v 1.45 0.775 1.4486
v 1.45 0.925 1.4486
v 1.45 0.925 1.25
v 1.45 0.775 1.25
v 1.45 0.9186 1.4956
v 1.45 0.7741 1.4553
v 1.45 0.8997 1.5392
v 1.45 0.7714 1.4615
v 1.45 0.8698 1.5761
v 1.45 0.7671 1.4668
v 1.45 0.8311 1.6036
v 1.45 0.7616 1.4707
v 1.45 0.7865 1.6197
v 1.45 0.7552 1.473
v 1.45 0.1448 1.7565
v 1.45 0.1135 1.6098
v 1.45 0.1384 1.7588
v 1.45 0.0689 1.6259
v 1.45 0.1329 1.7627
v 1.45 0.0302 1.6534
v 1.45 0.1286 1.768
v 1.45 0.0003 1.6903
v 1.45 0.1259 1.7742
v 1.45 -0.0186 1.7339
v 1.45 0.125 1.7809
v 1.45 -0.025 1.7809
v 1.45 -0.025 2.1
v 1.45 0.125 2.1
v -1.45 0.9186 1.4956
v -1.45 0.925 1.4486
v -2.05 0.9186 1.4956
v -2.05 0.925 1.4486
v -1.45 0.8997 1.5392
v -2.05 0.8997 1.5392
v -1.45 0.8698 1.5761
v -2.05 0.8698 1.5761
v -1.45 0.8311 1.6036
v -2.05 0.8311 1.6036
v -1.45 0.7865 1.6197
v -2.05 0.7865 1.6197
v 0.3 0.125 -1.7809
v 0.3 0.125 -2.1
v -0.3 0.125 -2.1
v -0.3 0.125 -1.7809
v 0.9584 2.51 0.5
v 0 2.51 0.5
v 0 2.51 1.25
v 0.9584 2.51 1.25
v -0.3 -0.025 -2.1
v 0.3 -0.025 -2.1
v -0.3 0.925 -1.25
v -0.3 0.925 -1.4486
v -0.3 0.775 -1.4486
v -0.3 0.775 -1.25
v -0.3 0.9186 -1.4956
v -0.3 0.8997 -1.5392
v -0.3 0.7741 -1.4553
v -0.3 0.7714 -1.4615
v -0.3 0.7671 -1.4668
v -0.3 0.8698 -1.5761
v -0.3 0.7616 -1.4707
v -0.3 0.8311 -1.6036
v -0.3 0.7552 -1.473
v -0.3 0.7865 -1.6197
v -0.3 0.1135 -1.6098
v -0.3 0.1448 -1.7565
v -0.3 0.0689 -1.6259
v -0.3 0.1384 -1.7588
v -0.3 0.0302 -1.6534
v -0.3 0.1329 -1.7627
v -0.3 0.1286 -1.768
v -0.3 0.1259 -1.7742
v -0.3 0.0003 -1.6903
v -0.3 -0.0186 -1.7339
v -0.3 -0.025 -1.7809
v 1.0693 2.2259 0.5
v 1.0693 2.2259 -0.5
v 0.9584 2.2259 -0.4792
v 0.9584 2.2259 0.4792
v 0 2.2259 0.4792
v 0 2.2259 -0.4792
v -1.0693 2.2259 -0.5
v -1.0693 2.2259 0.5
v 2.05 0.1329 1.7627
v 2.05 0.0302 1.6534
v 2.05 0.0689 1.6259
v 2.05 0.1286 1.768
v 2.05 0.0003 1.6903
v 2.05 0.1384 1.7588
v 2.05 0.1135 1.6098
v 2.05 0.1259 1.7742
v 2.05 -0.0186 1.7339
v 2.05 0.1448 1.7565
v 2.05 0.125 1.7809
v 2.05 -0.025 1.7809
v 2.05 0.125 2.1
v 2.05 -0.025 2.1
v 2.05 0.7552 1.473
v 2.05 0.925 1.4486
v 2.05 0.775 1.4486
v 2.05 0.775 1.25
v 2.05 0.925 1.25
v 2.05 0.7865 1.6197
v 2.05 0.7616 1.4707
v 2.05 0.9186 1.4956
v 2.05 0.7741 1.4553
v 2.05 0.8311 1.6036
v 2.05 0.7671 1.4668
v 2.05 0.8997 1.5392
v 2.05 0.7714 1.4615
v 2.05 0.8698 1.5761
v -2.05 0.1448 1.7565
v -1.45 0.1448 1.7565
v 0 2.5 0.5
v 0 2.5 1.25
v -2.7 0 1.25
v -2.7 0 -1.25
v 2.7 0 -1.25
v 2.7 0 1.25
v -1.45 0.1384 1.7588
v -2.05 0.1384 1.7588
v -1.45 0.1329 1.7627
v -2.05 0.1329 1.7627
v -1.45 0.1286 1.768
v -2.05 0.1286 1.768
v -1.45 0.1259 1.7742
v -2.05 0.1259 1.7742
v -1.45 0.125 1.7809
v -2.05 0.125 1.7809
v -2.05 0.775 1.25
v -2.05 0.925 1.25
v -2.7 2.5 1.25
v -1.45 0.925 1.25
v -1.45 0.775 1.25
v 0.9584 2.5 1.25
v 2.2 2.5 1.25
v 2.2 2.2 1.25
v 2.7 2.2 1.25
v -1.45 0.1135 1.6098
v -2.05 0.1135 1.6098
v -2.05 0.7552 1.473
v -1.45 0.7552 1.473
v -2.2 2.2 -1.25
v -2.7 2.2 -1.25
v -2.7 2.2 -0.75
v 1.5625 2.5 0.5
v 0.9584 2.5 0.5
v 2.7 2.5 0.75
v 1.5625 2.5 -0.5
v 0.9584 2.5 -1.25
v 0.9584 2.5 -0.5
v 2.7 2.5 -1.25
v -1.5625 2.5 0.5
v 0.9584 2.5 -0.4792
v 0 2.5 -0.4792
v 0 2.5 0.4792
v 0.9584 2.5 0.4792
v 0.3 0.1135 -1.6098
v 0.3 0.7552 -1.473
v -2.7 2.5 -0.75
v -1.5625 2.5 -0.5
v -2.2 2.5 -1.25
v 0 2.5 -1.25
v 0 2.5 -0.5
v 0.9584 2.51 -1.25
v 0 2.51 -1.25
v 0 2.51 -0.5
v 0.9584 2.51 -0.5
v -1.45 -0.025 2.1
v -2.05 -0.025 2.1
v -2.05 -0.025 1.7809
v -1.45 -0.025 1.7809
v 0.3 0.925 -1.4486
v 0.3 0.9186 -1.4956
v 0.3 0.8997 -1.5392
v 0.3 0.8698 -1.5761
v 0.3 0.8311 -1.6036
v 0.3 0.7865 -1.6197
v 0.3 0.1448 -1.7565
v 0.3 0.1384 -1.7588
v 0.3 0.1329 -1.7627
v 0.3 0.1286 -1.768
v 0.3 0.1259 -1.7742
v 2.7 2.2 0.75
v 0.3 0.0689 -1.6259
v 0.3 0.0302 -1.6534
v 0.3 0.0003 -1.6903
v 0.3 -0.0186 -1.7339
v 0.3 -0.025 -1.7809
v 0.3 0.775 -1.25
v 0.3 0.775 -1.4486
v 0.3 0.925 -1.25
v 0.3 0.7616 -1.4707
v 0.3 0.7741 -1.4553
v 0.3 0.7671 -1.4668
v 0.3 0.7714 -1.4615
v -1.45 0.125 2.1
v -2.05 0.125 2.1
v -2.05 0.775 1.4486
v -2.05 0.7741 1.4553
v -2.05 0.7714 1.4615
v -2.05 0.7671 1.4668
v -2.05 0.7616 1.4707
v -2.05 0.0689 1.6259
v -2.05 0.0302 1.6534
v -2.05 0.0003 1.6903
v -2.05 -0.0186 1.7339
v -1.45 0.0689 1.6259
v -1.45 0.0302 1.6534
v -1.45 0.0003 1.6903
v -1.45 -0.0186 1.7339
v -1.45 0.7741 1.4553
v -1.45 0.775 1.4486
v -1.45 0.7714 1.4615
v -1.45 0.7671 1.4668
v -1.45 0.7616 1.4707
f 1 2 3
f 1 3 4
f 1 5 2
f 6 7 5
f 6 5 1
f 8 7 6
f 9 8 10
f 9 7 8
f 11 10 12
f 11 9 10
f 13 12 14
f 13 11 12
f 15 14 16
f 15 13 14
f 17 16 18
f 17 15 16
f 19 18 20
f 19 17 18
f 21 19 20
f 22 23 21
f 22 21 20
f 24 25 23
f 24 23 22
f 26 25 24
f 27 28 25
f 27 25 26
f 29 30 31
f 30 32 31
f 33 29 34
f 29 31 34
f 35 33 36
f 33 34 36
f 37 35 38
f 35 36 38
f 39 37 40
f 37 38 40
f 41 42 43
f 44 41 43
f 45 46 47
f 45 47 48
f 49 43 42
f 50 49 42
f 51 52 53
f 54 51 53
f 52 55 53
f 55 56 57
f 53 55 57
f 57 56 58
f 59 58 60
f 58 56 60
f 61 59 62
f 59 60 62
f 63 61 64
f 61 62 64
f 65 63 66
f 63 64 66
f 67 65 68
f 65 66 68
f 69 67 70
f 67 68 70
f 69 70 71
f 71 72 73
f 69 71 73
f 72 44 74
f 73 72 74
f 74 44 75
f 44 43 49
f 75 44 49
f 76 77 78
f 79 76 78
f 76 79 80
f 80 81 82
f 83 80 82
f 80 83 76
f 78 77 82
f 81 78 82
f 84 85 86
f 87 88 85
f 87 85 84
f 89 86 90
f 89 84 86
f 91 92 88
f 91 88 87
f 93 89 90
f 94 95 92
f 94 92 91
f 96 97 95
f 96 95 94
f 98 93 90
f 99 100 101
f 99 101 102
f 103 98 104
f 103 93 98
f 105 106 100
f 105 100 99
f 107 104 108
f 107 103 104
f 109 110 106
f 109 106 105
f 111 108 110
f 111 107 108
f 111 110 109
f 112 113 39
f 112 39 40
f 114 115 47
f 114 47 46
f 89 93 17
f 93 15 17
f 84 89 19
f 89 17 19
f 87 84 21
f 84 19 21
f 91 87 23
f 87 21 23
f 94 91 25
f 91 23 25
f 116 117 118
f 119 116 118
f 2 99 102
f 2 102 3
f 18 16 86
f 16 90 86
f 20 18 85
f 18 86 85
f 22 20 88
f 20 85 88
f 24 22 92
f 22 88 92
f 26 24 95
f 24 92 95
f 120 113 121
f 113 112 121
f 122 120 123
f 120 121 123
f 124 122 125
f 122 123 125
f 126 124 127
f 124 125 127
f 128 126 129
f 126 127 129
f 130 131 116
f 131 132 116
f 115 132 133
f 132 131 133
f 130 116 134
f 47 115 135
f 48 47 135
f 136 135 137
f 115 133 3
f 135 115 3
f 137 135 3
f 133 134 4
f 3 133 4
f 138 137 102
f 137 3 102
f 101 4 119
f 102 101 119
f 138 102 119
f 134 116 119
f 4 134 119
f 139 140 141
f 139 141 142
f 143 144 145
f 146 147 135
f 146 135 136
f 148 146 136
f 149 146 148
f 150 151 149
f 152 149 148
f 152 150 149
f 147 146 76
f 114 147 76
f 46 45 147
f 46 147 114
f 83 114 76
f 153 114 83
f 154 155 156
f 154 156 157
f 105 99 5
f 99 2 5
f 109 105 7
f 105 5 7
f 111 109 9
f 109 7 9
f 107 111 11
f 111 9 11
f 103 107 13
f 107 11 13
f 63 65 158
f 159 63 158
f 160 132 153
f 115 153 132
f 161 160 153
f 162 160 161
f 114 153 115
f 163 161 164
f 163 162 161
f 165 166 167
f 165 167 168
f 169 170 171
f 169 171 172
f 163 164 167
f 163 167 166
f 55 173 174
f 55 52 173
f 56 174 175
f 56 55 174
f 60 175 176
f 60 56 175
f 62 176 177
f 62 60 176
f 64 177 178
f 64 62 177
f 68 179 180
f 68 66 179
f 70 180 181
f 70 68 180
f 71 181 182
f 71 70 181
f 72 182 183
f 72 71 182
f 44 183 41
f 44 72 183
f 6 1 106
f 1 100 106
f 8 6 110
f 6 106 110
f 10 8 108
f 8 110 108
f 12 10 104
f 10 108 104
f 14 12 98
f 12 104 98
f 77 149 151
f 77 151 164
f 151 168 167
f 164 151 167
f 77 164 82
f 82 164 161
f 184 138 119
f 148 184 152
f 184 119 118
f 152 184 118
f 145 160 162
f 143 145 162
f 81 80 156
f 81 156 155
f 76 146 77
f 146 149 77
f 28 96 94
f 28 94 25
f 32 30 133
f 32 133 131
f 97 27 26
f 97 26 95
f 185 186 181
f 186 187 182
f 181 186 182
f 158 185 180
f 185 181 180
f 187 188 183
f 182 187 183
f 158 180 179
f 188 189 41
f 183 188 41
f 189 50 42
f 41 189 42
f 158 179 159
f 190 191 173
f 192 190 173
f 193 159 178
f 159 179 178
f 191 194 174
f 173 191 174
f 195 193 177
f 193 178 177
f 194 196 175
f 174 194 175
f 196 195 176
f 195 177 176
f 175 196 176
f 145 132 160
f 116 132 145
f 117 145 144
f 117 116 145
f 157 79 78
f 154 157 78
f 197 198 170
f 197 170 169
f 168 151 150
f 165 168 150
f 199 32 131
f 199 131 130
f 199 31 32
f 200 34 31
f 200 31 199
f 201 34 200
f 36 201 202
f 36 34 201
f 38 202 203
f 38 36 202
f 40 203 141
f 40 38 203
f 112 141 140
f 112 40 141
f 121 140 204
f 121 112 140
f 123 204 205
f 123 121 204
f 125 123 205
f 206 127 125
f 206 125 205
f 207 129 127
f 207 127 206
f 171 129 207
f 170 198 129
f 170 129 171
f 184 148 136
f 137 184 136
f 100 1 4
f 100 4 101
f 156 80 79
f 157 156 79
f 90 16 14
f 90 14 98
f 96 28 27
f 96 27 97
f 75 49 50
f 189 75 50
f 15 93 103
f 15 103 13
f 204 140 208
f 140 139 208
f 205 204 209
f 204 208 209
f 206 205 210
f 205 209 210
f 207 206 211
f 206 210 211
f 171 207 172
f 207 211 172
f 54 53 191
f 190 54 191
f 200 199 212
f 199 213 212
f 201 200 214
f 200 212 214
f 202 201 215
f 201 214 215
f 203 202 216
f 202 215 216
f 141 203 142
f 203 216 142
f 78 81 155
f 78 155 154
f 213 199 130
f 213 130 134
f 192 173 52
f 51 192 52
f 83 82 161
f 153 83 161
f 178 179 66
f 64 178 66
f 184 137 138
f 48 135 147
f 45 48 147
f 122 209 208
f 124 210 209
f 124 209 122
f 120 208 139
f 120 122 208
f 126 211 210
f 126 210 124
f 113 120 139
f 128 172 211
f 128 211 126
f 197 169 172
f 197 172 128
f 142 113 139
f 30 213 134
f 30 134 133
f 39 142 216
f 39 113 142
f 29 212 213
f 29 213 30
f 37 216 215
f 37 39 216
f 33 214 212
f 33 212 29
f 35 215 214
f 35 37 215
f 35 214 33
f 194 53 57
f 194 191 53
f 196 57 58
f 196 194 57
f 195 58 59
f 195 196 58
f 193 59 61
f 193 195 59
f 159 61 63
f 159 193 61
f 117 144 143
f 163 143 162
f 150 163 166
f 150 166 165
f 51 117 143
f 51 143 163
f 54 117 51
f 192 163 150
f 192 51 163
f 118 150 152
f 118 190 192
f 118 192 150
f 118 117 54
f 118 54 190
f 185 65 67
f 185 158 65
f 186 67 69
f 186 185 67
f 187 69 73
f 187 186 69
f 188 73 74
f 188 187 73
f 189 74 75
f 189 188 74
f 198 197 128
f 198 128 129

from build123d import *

# Parameters (mm, degrees)
SKETCH1_W               = 5.4
SKETCH1_H               = 2.5
BOSS_EXTRUDE1_DEPTH     = 2.5
CUT_EXTRUDE1_DEPTH      = 0.3
CUT_EXTRUDE2_DEPTH      = 0.5
CUT_EXTRUDE2_DEPTH_BACK = 0.5
SKETCH4_W               = 0.958388154
SKETCH4_H               = 0.958388154
BOSS_EXTRUDE2_DEPTH     = 0.274135
SKETCH5_W               = 0.958388154
SKETCH5_H               = 0.75
BOSS_EXTRUDE3_DEPTH     = 0.01
SKETCH6_W               = 0.6
SKETCH6_H               = 0.15
LPATTERN1_COUNT         = 2
LPATTERN1_PITCH         = 1.75
LPATTERN1_COL_COUNT     = 2
LPATTERN1_COL_PITCH     = 1.75
SKETCH7_W               = 0.897503452
SKETCH7_H               = 1.940022621
CUT_EXTRUDE3_DEPTH      = 0.85


with BuildPart() as part:
    # Sketch1 → Boss-Extrude1 (new body)
    with BuildSketch(Plane(origin=(0, 0, 0), x_dir=(1, 0, 0), z_dir=(0, 1, 0))):
        Rectangle(SKETCH1_W, SKETCH1_H)
    extrude(amount=BOSS_EXTRUDE1_DEPTH)

    # Sketch2 → Cut-Extrude1 (cut)
    with BuildSketch(Plane(origin=(0, 2.5, 0), x_dir=(1, 0, 0), z_dir=(0, 1, 0))):
        Polygon((-2.7, 1.25), (-2.7, 0.75), (-2.2, 1.25), align=None)
        Polygon((2.2, -1.25), (2.7, -1.25), (2.7, -0.75), align=None)
    extrude(amount=-CUT_EXTRUDE1_DEPTH, mode=Mode.SUBTRACT)

    # Sketch3 → Cut-Extrude2 (cut, two sides)
    with BuildSketch(Plane.XY) as cut_extrude2_sk:
        Polygon((1.562546912, 2.5), (1.069337519, 2.22586461), (-1.069337519, 2.22586461), (-1.562546912, 2.5), align=None)
    extrude(amount=CUT_EXTRUDE2_DEPTH, mode=Mode.SUBTRACT)
    extrude(cut_extrude2_sk.sketch, amount=-CUT_EXTRUDE2_DEPTH_BACK, mode=Mode.SUBTRACT)

    # Sketch4 → Boss-Extrude2 (add)
    with BuildSketch(Plane(origin=(0, 2.22586461, 0), x_dir=(1, 0, 0), z_dir=(0, 1, 0))):
        with Locations((0.479194077, 0)):
            Rectangle(SKETCH4_W, SKETCH4_H)
    extrude(amount=BOSS_EXTRUDE2_DEPTH)

    # Sketch5 → Boss-Extrude3 (add)
    with BuildSketch(Plane(origin=(0, 2.5, 0), x_dir=(1, 0, 0), z_dir=(0, 1, 0))):
        with Locations((0.479194077, 0.875)):
            Rectangle(SKETCH5_W, SKETCH5_H)
        with Locations((0.479194077, -0.875)):
            Rectangle(SKETCH5_W, SKETCH5_H)
    extrude(amount=BOSS_EXTRUDE3_DEPTH)

    # Sweep1: sweep along a curve in space
    with BuildLine() as sweep1_path:
        Line((0, 0.85, 1.25), (0, 0.85, 1.44856475))
        ThreePointArc((0, 0.85, 1.44856475), (0, 0.827731782, 1.51147556), (0, 0.770844599, 1.546368138))
        Line((0, 0.770844599, 1.546368138), (0, 0.129155401, 1.683129801))
        ThreePointArc((0, 0.129155401, 1.683129801), (0, 0.072268218, 1.718022379), (0, 0.05, 1.780933189))
        Line((0, 0.05, 1.780933189), (0, 0.05, 2.1))
    # Sketch6 → Sweep1 (sweep)
    with BuildSketch(Plane.XY.offset(1.25)):
        with Locations((0, 0.85)):
            Rectangle(SKETCH6_W, SKETCH6_H)
    sweep1 = sweep(path=sweep1_path.line)

    # Mirror1: Sweep1 across plane
    add(sweep1.mirror(Plane.XY))

    # LPattern1: Sweep1 ×2
    with Locations(*[(i * LPATTERN1_PITCH, 0, 0) for i in range(1, LPATTERN1_COUNT)]):
        add(sweep1)

    # LPattern1 col: Sweep1 ×2
    with Locations(*[(-i * LPATTERN1_COL_PITCH, 0, 0) for i in range(1, LPATTERN1_COL_COUNT)]):
        add(sweep1)

    # Sketch7 → Cut-Extrude3 (cut)
    with BuildSketch(Plane.XY.offset(2.1)):
        with Locations((0, 0.786478049)):
            Rectangle(SKETCH7_W, SKETCH7_H)
    extrude(amount=-CUT_EXTRUDE3_DEPTH, mode=Mode.SUBTRACT)


solid = part.part
